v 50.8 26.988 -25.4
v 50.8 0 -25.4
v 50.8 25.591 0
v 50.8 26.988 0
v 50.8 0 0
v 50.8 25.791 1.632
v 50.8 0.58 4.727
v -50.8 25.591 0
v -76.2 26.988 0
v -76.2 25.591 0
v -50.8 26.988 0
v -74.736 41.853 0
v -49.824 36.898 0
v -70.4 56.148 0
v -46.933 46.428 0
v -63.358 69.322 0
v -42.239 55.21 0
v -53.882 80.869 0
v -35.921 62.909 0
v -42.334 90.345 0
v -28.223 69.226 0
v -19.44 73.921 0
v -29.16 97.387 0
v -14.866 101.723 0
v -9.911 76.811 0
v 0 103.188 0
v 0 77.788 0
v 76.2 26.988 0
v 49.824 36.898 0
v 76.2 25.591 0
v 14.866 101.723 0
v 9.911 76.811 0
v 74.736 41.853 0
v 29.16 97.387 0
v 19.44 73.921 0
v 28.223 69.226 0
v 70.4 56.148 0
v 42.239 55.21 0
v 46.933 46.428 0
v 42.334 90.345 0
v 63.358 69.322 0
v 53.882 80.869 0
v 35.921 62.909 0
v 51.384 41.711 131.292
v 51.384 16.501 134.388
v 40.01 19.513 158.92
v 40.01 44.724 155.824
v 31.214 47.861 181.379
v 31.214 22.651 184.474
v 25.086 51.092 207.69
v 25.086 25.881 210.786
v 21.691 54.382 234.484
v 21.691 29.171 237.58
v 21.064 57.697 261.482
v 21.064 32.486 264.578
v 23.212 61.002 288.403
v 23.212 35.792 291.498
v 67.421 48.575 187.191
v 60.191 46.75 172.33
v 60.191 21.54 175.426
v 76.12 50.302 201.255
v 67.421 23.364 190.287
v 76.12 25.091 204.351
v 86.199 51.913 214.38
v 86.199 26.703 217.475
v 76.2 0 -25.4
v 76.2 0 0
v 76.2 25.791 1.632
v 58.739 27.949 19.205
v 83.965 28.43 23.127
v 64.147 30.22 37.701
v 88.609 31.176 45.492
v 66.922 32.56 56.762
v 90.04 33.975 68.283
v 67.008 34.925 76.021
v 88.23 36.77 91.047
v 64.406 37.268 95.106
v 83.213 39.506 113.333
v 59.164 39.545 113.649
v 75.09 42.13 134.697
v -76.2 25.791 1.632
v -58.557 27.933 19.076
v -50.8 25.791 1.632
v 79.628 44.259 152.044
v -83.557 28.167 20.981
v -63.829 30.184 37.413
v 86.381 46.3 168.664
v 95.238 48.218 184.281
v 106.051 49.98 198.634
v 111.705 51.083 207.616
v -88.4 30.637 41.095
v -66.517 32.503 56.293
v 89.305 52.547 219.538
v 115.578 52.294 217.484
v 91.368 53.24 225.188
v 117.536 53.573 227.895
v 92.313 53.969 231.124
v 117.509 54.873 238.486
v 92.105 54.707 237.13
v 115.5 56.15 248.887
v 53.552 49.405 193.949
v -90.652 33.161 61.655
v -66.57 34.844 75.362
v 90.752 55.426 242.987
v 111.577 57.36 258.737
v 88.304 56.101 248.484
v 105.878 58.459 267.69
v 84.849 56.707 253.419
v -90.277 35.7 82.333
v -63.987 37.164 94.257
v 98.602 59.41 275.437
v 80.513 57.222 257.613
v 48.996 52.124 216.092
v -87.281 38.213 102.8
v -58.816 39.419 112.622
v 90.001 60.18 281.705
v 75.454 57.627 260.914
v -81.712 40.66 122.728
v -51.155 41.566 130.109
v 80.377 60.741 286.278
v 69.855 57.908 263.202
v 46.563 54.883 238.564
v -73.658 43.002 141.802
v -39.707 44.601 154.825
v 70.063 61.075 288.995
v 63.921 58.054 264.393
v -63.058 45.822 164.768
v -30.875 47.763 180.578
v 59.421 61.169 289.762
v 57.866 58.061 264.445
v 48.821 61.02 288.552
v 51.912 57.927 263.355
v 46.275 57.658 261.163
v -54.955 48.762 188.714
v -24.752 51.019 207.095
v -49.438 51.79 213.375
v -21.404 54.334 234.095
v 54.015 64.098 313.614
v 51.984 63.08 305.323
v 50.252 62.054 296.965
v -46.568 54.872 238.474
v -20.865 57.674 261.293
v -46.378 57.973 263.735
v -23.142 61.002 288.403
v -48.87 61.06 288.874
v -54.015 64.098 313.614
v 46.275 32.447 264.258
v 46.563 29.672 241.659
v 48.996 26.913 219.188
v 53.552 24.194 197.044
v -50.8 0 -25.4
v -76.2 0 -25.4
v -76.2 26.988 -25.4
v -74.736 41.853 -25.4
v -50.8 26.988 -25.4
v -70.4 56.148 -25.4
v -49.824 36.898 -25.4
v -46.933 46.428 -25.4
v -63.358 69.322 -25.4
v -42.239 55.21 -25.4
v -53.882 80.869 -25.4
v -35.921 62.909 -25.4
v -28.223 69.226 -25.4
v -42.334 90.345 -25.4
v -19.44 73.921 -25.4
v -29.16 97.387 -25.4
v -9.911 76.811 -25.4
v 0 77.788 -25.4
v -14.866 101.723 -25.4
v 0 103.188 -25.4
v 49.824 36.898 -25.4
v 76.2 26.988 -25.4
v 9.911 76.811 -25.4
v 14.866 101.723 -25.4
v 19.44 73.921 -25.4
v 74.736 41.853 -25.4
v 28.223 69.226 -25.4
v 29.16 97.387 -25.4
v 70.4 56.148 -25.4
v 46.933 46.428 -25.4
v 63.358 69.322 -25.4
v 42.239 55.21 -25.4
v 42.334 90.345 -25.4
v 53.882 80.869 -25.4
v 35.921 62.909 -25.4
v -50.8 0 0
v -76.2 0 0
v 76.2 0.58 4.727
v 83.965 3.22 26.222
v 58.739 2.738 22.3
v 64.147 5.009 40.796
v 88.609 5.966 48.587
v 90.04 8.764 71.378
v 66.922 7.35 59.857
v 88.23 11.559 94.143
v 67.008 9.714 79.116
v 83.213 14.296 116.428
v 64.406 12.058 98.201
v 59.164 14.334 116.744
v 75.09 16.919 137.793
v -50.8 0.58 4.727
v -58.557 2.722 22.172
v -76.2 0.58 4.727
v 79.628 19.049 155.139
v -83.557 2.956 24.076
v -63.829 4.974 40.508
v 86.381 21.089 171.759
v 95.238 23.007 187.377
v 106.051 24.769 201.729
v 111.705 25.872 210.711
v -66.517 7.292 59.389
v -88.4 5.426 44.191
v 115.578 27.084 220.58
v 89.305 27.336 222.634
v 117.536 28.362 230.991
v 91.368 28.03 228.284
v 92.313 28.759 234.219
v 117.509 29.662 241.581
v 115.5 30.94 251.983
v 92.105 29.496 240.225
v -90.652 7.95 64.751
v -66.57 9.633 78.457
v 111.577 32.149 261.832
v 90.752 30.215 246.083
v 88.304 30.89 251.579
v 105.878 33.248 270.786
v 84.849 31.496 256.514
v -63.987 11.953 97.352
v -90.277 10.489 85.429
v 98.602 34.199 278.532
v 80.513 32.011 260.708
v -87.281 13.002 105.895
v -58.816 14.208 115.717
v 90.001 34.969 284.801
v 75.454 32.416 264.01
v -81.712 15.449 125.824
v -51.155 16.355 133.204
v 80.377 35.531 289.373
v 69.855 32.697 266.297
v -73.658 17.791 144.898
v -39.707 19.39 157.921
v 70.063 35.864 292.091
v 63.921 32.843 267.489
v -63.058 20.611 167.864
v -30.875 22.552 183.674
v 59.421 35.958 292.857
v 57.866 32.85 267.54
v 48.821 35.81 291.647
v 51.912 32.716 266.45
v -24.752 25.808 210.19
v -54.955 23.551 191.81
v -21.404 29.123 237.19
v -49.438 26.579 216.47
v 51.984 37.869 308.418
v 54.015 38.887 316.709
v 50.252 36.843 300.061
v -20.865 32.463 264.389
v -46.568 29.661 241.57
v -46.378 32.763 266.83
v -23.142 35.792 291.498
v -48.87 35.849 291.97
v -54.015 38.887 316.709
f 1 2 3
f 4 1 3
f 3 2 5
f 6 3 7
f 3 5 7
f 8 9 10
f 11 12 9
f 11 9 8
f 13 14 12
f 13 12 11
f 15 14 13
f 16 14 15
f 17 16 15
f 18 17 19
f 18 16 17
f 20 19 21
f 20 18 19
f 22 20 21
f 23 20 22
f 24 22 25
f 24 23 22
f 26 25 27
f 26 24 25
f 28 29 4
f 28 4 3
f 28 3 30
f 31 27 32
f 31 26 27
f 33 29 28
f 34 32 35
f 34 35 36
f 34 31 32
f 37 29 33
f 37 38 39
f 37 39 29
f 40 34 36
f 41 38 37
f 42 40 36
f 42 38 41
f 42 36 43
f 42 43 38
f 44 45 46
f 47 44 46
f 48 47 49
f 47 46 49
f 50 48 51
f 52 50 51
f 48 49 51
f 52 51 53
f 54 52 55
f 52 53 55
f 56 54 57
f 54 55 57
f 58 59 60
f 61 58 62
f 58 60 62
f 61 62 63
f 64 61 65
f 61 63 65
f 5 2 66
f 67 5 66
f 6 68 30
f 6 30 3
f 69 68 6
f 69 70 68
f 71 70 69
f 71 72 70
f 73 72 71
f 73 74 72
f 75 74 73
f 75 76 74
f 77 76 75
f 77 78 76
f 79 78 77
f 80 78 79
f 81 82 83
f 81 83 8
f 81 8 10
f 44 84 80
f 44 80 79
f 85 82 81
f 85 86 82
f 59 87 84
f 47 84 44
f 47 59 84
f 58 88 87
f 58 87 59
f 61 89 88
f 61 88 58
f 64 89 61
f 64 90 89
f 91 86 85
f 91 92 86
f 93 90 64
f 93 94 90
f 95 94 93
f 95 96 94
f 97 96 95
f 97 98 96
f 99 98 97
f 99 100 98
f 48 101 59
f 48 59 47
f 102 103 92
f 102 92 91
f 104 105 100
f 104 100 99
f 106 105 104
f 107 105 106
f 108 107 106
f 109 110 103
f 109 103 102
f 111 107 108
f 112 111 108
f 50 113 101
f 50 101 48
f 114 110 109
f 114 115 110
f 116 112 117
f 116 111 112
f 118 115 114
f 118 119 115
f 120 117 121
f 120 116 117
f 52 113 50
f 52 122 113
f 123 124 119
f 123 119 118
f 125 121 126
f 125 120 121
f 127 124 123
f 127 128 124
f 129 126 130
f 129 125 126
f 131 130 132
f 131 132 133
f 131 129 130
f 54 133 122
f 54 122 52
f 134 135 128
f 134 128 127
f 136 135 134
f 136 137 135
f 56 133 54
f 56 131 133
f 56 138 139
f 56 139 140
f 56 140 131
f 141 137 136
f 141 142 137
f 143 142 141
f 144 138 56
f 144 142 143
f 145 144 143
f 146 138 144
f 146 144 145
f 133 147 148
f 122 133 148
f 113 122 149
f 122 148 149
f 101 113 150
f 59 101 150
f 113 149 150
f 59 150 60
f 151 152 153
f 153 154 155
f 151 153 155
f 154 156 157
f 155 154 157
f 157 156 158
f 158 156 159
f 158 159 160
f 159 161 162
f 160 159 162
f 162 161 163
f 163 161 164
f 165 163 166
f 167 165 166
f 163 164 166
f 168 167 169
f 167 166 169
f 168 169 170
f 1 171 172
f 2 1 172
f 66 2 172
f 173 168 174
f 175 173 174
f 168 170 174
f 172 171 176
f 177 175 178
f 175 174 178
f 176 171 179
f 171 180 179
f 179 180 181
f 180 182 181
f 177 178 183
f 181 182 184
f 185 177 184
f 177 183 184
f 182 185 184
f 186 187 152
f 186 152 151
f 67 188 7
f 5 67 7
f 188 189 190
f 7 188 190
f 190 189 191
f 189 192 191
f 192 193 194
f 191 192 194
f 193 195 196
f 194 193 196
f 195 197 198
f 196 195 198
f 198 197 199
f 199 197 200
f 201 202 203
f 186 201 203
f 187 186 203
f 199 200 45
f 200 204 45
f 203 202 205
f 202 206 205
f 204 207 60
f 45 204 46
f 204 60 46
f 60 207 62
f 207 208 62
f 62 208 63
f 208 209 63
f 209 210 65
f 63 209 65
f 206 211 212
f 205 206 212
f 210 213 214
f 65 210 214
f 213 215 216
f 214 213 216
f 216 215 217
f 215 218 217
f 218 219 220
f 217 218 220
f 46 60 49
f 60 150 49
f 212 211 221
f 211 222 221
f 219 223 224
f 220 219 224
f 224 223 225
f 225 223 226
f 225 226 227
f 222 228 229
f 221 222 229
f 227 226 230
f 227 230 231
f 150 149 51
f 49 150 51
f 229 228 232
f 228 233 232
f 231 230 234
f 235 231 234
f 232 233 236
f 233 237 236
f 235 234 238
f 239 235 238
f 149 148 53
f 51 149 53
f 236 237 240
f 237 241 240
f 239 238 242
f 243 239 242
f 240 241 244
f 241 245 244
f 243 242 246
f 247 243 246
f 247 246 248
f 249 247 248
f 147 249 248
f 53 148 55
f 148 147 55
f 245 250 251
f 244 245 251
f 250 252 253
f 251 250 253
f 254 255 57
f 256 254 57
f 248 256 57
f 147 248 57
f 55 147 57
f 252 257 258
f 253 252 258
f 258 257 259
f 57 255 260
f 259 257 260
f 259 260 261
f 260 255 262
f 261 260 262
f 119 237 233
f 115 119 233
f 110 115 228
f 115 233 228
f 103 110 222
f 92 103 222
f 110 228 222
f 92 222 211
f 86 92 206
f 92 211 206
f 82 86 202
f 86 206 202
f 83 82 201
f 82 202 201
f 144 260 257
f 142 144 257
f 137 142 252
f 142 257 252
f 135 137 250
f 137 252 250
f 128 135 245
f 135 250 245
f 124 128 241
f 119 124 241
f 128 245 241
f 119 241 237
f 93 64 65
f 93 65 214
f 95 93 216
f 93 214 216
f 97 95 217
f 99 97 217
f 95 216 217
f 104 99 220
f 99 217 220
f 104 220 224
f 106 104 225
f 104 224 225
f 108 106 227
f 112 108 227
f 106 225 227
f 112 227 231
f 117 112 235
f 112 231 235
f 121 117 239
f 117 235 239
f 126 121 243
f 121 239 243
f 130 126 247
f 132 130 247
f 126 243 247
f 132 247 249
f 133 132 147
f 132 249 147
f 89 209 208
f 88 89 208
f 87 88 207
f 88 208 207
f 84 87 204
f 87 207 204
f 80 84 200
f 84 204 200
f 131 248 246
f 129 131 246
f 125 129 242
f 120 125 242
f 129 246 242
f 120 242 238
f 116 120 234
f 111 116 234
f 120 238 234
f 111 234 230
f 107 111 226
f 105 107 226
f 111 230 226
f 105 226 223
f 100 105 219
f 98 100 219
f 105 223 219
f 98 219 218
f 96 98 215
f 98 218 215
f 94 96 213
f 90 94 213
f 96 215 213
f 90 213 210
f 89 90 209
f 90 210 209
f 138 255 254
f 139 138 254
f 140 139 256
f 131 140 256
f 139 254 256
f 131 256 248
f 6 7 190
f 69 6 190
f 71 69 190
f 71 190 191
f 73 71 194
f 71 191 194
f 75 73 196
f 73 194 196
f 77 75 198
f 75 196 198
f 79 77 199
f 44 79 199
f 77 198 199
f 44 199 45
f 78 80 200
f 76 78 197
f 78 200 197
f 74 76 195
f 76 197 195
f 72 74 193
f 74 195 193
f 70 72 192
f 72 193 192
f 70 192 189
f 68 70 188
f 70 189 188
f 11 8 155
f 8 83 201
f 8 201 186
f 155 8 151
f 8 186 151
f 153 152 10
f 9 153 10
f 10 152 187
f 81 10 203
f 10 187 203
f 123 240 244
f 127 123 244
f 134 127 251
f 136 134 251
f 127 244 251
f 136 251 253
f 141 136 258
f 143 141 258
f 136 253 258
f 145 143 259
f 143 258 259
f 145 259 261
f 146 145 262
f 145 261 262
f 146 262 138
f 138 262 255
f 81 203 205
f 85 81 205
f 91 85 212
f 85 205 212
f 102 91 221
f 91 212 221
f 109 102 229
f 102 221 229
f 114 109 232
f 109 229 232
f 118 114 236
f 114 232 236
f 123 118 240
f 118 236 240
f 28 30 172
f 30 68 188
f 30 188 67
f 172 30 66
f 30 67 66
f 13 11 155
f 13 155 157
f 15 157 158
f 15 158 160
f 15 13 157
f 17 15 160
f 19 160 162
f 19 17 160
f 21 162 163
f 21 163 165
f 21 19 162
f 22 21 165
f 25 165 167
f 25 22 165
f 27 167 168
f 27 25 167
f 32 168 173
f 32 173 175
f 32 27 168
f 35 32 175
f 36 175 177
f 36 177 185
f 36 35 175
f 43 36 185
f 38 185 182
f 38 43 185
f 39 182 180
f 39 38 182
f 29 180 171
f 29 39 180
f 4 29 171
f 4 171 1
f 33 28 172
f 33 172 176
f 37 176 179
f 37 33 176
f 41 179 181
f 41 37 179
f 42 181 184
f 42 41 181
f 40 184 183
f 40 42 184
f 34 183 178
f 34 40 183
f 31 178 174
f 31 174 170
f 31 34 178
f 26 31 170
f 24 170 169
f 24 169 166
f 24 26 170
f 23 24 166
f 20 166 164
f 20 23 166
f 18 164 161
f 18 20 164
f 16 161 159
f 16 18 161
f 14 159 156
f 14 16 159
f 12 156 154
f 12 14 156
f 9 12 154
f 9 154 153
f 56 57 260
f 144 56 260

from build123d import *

# Parameters (mm, degrees)
F4_DEPTH = 25.4
F6_DEPTH = 25.4


with BuildPart() as f4:
    # F3 (on offset) → F4 (new body)
    with BuildSketch(Plane.XY):
        with BuildLine():
            Line((-76.2, 26.9875), (-76.2, 0))
            Line((-76.2, 0), (-50.8, 0))
            Line((-50.8, 0), (-50.8, 26.9875))
            ThreePointArc((-50.8, 26.9875), (0, 77.7875), (50.8, 26.9875))
            Line((50.8, 26.9875), (50.8, 0))
            Line((50.8, 0), (76.2, 0))
            Line((76.2, 0), (76.2, 26.9875))
            ThreePointArc((76.2, 26.9875), (0, 103.1875), (-76.2, 26.9875))
        make_face()
    extrude(amount=-F4_DEPTH)

    # F5 (on line) → F6 (join)
    with BuildSketch(Plane(origin=(0, 0, 0), x_dir=(-1, 0, 0), z_dir=(0, 0.9925461516, -0.1218693434))):
        with BuildLine():
            ThreePointArc((-75.0903723478, 138.827645489), (-90.0403532632, 71.9142183688), (-76.2, 4.7625))
            Line((-76.2, 4.7625), (-76.2, 0))
            Line((-76.2, 0), (-50.8, 0))
            Line((-50.8, 0), (-50.8, 4.7625))
            ThreePointArc((-50.8, 4.7625), (-67.3023617732, 70.0071639204), (-51.3841879778, 135.3968103272))
            ThreePointArc((-51.3841879778, 135.3968103272), (-25.0859353678, 212.368668197), (-23.2117561056, 293.6875002493))
            Line((-23.2117561056, 293.6875002493), (0, 293.6875002493))
            Line((0, 293.6875002493), (23.1415493167, 293.6875002493))
            ThreePointArc((23.1415493167, 293.6875002493), (24.7523028396, 211.7684987185), (51.1552849917, 134.2043325579))
            ThreePointArc((51.1552849917, 134.2043325579), (66.8742650231, 69.439784083), (50.8, 4.7625))
            Line((50.8, 4.7625), (50.8, 0))
            Line((50.8, 0), (76.2, 0))
            Line((76.2, 0), (76.2, 4.7625))
            ThreePointArc((76.2, 4.7625), (90.7935935425, 75.6597014149), (73.6577047551, 145.9857098073))
            ThreePointArc((73.6577047551, 145.9857098073), (47.6694306232, 230.702066542), (54.0150973414, 319.0874952316))
            Line((54.0150973414, 319.0874952316), (0, 319.0874952316))
            Line((0, 319.0874952316), (-54.0150973414, 319.0874952316))
            ThreePointArc((-54.0150973414, 319.0874952316), (-51.0804025225, 306.5319685143), (-48.8205663921, 293.8376065574))
            ThreePointArc((-48.8205663921, 293.8376065574), (-108.938602772, 268.4421399471), (-106.0506710111, 203.2442268465))
            ThreePointArc((-106.0506710111, 203.2442268465), (-86.3813942483, 173.049340693), (-75.0903723478, 138.827645489))
        make_face()
        with BuildLine():
            ThreePointArc((-46.2746955842, 266.2427872527), (-48.9959426673, 220.834025793), (-60.1912430767, 176.7429149913))
            ThreePointArc((-60.1912430767, 176.7429149913), (-71.5917023099, 198.9100774911), (-86.1994937771, 219.1082455385))
            ThreePointArc((-86.1994937771, 219.1082455385), (-84.8490348444, 258.4405568096), (-46.2746955842, 266.2427872527))
        make_face(mode=Mode.SUBTRACT)
    extrude(amount=F6_DEPTH)


solid = f4.part
